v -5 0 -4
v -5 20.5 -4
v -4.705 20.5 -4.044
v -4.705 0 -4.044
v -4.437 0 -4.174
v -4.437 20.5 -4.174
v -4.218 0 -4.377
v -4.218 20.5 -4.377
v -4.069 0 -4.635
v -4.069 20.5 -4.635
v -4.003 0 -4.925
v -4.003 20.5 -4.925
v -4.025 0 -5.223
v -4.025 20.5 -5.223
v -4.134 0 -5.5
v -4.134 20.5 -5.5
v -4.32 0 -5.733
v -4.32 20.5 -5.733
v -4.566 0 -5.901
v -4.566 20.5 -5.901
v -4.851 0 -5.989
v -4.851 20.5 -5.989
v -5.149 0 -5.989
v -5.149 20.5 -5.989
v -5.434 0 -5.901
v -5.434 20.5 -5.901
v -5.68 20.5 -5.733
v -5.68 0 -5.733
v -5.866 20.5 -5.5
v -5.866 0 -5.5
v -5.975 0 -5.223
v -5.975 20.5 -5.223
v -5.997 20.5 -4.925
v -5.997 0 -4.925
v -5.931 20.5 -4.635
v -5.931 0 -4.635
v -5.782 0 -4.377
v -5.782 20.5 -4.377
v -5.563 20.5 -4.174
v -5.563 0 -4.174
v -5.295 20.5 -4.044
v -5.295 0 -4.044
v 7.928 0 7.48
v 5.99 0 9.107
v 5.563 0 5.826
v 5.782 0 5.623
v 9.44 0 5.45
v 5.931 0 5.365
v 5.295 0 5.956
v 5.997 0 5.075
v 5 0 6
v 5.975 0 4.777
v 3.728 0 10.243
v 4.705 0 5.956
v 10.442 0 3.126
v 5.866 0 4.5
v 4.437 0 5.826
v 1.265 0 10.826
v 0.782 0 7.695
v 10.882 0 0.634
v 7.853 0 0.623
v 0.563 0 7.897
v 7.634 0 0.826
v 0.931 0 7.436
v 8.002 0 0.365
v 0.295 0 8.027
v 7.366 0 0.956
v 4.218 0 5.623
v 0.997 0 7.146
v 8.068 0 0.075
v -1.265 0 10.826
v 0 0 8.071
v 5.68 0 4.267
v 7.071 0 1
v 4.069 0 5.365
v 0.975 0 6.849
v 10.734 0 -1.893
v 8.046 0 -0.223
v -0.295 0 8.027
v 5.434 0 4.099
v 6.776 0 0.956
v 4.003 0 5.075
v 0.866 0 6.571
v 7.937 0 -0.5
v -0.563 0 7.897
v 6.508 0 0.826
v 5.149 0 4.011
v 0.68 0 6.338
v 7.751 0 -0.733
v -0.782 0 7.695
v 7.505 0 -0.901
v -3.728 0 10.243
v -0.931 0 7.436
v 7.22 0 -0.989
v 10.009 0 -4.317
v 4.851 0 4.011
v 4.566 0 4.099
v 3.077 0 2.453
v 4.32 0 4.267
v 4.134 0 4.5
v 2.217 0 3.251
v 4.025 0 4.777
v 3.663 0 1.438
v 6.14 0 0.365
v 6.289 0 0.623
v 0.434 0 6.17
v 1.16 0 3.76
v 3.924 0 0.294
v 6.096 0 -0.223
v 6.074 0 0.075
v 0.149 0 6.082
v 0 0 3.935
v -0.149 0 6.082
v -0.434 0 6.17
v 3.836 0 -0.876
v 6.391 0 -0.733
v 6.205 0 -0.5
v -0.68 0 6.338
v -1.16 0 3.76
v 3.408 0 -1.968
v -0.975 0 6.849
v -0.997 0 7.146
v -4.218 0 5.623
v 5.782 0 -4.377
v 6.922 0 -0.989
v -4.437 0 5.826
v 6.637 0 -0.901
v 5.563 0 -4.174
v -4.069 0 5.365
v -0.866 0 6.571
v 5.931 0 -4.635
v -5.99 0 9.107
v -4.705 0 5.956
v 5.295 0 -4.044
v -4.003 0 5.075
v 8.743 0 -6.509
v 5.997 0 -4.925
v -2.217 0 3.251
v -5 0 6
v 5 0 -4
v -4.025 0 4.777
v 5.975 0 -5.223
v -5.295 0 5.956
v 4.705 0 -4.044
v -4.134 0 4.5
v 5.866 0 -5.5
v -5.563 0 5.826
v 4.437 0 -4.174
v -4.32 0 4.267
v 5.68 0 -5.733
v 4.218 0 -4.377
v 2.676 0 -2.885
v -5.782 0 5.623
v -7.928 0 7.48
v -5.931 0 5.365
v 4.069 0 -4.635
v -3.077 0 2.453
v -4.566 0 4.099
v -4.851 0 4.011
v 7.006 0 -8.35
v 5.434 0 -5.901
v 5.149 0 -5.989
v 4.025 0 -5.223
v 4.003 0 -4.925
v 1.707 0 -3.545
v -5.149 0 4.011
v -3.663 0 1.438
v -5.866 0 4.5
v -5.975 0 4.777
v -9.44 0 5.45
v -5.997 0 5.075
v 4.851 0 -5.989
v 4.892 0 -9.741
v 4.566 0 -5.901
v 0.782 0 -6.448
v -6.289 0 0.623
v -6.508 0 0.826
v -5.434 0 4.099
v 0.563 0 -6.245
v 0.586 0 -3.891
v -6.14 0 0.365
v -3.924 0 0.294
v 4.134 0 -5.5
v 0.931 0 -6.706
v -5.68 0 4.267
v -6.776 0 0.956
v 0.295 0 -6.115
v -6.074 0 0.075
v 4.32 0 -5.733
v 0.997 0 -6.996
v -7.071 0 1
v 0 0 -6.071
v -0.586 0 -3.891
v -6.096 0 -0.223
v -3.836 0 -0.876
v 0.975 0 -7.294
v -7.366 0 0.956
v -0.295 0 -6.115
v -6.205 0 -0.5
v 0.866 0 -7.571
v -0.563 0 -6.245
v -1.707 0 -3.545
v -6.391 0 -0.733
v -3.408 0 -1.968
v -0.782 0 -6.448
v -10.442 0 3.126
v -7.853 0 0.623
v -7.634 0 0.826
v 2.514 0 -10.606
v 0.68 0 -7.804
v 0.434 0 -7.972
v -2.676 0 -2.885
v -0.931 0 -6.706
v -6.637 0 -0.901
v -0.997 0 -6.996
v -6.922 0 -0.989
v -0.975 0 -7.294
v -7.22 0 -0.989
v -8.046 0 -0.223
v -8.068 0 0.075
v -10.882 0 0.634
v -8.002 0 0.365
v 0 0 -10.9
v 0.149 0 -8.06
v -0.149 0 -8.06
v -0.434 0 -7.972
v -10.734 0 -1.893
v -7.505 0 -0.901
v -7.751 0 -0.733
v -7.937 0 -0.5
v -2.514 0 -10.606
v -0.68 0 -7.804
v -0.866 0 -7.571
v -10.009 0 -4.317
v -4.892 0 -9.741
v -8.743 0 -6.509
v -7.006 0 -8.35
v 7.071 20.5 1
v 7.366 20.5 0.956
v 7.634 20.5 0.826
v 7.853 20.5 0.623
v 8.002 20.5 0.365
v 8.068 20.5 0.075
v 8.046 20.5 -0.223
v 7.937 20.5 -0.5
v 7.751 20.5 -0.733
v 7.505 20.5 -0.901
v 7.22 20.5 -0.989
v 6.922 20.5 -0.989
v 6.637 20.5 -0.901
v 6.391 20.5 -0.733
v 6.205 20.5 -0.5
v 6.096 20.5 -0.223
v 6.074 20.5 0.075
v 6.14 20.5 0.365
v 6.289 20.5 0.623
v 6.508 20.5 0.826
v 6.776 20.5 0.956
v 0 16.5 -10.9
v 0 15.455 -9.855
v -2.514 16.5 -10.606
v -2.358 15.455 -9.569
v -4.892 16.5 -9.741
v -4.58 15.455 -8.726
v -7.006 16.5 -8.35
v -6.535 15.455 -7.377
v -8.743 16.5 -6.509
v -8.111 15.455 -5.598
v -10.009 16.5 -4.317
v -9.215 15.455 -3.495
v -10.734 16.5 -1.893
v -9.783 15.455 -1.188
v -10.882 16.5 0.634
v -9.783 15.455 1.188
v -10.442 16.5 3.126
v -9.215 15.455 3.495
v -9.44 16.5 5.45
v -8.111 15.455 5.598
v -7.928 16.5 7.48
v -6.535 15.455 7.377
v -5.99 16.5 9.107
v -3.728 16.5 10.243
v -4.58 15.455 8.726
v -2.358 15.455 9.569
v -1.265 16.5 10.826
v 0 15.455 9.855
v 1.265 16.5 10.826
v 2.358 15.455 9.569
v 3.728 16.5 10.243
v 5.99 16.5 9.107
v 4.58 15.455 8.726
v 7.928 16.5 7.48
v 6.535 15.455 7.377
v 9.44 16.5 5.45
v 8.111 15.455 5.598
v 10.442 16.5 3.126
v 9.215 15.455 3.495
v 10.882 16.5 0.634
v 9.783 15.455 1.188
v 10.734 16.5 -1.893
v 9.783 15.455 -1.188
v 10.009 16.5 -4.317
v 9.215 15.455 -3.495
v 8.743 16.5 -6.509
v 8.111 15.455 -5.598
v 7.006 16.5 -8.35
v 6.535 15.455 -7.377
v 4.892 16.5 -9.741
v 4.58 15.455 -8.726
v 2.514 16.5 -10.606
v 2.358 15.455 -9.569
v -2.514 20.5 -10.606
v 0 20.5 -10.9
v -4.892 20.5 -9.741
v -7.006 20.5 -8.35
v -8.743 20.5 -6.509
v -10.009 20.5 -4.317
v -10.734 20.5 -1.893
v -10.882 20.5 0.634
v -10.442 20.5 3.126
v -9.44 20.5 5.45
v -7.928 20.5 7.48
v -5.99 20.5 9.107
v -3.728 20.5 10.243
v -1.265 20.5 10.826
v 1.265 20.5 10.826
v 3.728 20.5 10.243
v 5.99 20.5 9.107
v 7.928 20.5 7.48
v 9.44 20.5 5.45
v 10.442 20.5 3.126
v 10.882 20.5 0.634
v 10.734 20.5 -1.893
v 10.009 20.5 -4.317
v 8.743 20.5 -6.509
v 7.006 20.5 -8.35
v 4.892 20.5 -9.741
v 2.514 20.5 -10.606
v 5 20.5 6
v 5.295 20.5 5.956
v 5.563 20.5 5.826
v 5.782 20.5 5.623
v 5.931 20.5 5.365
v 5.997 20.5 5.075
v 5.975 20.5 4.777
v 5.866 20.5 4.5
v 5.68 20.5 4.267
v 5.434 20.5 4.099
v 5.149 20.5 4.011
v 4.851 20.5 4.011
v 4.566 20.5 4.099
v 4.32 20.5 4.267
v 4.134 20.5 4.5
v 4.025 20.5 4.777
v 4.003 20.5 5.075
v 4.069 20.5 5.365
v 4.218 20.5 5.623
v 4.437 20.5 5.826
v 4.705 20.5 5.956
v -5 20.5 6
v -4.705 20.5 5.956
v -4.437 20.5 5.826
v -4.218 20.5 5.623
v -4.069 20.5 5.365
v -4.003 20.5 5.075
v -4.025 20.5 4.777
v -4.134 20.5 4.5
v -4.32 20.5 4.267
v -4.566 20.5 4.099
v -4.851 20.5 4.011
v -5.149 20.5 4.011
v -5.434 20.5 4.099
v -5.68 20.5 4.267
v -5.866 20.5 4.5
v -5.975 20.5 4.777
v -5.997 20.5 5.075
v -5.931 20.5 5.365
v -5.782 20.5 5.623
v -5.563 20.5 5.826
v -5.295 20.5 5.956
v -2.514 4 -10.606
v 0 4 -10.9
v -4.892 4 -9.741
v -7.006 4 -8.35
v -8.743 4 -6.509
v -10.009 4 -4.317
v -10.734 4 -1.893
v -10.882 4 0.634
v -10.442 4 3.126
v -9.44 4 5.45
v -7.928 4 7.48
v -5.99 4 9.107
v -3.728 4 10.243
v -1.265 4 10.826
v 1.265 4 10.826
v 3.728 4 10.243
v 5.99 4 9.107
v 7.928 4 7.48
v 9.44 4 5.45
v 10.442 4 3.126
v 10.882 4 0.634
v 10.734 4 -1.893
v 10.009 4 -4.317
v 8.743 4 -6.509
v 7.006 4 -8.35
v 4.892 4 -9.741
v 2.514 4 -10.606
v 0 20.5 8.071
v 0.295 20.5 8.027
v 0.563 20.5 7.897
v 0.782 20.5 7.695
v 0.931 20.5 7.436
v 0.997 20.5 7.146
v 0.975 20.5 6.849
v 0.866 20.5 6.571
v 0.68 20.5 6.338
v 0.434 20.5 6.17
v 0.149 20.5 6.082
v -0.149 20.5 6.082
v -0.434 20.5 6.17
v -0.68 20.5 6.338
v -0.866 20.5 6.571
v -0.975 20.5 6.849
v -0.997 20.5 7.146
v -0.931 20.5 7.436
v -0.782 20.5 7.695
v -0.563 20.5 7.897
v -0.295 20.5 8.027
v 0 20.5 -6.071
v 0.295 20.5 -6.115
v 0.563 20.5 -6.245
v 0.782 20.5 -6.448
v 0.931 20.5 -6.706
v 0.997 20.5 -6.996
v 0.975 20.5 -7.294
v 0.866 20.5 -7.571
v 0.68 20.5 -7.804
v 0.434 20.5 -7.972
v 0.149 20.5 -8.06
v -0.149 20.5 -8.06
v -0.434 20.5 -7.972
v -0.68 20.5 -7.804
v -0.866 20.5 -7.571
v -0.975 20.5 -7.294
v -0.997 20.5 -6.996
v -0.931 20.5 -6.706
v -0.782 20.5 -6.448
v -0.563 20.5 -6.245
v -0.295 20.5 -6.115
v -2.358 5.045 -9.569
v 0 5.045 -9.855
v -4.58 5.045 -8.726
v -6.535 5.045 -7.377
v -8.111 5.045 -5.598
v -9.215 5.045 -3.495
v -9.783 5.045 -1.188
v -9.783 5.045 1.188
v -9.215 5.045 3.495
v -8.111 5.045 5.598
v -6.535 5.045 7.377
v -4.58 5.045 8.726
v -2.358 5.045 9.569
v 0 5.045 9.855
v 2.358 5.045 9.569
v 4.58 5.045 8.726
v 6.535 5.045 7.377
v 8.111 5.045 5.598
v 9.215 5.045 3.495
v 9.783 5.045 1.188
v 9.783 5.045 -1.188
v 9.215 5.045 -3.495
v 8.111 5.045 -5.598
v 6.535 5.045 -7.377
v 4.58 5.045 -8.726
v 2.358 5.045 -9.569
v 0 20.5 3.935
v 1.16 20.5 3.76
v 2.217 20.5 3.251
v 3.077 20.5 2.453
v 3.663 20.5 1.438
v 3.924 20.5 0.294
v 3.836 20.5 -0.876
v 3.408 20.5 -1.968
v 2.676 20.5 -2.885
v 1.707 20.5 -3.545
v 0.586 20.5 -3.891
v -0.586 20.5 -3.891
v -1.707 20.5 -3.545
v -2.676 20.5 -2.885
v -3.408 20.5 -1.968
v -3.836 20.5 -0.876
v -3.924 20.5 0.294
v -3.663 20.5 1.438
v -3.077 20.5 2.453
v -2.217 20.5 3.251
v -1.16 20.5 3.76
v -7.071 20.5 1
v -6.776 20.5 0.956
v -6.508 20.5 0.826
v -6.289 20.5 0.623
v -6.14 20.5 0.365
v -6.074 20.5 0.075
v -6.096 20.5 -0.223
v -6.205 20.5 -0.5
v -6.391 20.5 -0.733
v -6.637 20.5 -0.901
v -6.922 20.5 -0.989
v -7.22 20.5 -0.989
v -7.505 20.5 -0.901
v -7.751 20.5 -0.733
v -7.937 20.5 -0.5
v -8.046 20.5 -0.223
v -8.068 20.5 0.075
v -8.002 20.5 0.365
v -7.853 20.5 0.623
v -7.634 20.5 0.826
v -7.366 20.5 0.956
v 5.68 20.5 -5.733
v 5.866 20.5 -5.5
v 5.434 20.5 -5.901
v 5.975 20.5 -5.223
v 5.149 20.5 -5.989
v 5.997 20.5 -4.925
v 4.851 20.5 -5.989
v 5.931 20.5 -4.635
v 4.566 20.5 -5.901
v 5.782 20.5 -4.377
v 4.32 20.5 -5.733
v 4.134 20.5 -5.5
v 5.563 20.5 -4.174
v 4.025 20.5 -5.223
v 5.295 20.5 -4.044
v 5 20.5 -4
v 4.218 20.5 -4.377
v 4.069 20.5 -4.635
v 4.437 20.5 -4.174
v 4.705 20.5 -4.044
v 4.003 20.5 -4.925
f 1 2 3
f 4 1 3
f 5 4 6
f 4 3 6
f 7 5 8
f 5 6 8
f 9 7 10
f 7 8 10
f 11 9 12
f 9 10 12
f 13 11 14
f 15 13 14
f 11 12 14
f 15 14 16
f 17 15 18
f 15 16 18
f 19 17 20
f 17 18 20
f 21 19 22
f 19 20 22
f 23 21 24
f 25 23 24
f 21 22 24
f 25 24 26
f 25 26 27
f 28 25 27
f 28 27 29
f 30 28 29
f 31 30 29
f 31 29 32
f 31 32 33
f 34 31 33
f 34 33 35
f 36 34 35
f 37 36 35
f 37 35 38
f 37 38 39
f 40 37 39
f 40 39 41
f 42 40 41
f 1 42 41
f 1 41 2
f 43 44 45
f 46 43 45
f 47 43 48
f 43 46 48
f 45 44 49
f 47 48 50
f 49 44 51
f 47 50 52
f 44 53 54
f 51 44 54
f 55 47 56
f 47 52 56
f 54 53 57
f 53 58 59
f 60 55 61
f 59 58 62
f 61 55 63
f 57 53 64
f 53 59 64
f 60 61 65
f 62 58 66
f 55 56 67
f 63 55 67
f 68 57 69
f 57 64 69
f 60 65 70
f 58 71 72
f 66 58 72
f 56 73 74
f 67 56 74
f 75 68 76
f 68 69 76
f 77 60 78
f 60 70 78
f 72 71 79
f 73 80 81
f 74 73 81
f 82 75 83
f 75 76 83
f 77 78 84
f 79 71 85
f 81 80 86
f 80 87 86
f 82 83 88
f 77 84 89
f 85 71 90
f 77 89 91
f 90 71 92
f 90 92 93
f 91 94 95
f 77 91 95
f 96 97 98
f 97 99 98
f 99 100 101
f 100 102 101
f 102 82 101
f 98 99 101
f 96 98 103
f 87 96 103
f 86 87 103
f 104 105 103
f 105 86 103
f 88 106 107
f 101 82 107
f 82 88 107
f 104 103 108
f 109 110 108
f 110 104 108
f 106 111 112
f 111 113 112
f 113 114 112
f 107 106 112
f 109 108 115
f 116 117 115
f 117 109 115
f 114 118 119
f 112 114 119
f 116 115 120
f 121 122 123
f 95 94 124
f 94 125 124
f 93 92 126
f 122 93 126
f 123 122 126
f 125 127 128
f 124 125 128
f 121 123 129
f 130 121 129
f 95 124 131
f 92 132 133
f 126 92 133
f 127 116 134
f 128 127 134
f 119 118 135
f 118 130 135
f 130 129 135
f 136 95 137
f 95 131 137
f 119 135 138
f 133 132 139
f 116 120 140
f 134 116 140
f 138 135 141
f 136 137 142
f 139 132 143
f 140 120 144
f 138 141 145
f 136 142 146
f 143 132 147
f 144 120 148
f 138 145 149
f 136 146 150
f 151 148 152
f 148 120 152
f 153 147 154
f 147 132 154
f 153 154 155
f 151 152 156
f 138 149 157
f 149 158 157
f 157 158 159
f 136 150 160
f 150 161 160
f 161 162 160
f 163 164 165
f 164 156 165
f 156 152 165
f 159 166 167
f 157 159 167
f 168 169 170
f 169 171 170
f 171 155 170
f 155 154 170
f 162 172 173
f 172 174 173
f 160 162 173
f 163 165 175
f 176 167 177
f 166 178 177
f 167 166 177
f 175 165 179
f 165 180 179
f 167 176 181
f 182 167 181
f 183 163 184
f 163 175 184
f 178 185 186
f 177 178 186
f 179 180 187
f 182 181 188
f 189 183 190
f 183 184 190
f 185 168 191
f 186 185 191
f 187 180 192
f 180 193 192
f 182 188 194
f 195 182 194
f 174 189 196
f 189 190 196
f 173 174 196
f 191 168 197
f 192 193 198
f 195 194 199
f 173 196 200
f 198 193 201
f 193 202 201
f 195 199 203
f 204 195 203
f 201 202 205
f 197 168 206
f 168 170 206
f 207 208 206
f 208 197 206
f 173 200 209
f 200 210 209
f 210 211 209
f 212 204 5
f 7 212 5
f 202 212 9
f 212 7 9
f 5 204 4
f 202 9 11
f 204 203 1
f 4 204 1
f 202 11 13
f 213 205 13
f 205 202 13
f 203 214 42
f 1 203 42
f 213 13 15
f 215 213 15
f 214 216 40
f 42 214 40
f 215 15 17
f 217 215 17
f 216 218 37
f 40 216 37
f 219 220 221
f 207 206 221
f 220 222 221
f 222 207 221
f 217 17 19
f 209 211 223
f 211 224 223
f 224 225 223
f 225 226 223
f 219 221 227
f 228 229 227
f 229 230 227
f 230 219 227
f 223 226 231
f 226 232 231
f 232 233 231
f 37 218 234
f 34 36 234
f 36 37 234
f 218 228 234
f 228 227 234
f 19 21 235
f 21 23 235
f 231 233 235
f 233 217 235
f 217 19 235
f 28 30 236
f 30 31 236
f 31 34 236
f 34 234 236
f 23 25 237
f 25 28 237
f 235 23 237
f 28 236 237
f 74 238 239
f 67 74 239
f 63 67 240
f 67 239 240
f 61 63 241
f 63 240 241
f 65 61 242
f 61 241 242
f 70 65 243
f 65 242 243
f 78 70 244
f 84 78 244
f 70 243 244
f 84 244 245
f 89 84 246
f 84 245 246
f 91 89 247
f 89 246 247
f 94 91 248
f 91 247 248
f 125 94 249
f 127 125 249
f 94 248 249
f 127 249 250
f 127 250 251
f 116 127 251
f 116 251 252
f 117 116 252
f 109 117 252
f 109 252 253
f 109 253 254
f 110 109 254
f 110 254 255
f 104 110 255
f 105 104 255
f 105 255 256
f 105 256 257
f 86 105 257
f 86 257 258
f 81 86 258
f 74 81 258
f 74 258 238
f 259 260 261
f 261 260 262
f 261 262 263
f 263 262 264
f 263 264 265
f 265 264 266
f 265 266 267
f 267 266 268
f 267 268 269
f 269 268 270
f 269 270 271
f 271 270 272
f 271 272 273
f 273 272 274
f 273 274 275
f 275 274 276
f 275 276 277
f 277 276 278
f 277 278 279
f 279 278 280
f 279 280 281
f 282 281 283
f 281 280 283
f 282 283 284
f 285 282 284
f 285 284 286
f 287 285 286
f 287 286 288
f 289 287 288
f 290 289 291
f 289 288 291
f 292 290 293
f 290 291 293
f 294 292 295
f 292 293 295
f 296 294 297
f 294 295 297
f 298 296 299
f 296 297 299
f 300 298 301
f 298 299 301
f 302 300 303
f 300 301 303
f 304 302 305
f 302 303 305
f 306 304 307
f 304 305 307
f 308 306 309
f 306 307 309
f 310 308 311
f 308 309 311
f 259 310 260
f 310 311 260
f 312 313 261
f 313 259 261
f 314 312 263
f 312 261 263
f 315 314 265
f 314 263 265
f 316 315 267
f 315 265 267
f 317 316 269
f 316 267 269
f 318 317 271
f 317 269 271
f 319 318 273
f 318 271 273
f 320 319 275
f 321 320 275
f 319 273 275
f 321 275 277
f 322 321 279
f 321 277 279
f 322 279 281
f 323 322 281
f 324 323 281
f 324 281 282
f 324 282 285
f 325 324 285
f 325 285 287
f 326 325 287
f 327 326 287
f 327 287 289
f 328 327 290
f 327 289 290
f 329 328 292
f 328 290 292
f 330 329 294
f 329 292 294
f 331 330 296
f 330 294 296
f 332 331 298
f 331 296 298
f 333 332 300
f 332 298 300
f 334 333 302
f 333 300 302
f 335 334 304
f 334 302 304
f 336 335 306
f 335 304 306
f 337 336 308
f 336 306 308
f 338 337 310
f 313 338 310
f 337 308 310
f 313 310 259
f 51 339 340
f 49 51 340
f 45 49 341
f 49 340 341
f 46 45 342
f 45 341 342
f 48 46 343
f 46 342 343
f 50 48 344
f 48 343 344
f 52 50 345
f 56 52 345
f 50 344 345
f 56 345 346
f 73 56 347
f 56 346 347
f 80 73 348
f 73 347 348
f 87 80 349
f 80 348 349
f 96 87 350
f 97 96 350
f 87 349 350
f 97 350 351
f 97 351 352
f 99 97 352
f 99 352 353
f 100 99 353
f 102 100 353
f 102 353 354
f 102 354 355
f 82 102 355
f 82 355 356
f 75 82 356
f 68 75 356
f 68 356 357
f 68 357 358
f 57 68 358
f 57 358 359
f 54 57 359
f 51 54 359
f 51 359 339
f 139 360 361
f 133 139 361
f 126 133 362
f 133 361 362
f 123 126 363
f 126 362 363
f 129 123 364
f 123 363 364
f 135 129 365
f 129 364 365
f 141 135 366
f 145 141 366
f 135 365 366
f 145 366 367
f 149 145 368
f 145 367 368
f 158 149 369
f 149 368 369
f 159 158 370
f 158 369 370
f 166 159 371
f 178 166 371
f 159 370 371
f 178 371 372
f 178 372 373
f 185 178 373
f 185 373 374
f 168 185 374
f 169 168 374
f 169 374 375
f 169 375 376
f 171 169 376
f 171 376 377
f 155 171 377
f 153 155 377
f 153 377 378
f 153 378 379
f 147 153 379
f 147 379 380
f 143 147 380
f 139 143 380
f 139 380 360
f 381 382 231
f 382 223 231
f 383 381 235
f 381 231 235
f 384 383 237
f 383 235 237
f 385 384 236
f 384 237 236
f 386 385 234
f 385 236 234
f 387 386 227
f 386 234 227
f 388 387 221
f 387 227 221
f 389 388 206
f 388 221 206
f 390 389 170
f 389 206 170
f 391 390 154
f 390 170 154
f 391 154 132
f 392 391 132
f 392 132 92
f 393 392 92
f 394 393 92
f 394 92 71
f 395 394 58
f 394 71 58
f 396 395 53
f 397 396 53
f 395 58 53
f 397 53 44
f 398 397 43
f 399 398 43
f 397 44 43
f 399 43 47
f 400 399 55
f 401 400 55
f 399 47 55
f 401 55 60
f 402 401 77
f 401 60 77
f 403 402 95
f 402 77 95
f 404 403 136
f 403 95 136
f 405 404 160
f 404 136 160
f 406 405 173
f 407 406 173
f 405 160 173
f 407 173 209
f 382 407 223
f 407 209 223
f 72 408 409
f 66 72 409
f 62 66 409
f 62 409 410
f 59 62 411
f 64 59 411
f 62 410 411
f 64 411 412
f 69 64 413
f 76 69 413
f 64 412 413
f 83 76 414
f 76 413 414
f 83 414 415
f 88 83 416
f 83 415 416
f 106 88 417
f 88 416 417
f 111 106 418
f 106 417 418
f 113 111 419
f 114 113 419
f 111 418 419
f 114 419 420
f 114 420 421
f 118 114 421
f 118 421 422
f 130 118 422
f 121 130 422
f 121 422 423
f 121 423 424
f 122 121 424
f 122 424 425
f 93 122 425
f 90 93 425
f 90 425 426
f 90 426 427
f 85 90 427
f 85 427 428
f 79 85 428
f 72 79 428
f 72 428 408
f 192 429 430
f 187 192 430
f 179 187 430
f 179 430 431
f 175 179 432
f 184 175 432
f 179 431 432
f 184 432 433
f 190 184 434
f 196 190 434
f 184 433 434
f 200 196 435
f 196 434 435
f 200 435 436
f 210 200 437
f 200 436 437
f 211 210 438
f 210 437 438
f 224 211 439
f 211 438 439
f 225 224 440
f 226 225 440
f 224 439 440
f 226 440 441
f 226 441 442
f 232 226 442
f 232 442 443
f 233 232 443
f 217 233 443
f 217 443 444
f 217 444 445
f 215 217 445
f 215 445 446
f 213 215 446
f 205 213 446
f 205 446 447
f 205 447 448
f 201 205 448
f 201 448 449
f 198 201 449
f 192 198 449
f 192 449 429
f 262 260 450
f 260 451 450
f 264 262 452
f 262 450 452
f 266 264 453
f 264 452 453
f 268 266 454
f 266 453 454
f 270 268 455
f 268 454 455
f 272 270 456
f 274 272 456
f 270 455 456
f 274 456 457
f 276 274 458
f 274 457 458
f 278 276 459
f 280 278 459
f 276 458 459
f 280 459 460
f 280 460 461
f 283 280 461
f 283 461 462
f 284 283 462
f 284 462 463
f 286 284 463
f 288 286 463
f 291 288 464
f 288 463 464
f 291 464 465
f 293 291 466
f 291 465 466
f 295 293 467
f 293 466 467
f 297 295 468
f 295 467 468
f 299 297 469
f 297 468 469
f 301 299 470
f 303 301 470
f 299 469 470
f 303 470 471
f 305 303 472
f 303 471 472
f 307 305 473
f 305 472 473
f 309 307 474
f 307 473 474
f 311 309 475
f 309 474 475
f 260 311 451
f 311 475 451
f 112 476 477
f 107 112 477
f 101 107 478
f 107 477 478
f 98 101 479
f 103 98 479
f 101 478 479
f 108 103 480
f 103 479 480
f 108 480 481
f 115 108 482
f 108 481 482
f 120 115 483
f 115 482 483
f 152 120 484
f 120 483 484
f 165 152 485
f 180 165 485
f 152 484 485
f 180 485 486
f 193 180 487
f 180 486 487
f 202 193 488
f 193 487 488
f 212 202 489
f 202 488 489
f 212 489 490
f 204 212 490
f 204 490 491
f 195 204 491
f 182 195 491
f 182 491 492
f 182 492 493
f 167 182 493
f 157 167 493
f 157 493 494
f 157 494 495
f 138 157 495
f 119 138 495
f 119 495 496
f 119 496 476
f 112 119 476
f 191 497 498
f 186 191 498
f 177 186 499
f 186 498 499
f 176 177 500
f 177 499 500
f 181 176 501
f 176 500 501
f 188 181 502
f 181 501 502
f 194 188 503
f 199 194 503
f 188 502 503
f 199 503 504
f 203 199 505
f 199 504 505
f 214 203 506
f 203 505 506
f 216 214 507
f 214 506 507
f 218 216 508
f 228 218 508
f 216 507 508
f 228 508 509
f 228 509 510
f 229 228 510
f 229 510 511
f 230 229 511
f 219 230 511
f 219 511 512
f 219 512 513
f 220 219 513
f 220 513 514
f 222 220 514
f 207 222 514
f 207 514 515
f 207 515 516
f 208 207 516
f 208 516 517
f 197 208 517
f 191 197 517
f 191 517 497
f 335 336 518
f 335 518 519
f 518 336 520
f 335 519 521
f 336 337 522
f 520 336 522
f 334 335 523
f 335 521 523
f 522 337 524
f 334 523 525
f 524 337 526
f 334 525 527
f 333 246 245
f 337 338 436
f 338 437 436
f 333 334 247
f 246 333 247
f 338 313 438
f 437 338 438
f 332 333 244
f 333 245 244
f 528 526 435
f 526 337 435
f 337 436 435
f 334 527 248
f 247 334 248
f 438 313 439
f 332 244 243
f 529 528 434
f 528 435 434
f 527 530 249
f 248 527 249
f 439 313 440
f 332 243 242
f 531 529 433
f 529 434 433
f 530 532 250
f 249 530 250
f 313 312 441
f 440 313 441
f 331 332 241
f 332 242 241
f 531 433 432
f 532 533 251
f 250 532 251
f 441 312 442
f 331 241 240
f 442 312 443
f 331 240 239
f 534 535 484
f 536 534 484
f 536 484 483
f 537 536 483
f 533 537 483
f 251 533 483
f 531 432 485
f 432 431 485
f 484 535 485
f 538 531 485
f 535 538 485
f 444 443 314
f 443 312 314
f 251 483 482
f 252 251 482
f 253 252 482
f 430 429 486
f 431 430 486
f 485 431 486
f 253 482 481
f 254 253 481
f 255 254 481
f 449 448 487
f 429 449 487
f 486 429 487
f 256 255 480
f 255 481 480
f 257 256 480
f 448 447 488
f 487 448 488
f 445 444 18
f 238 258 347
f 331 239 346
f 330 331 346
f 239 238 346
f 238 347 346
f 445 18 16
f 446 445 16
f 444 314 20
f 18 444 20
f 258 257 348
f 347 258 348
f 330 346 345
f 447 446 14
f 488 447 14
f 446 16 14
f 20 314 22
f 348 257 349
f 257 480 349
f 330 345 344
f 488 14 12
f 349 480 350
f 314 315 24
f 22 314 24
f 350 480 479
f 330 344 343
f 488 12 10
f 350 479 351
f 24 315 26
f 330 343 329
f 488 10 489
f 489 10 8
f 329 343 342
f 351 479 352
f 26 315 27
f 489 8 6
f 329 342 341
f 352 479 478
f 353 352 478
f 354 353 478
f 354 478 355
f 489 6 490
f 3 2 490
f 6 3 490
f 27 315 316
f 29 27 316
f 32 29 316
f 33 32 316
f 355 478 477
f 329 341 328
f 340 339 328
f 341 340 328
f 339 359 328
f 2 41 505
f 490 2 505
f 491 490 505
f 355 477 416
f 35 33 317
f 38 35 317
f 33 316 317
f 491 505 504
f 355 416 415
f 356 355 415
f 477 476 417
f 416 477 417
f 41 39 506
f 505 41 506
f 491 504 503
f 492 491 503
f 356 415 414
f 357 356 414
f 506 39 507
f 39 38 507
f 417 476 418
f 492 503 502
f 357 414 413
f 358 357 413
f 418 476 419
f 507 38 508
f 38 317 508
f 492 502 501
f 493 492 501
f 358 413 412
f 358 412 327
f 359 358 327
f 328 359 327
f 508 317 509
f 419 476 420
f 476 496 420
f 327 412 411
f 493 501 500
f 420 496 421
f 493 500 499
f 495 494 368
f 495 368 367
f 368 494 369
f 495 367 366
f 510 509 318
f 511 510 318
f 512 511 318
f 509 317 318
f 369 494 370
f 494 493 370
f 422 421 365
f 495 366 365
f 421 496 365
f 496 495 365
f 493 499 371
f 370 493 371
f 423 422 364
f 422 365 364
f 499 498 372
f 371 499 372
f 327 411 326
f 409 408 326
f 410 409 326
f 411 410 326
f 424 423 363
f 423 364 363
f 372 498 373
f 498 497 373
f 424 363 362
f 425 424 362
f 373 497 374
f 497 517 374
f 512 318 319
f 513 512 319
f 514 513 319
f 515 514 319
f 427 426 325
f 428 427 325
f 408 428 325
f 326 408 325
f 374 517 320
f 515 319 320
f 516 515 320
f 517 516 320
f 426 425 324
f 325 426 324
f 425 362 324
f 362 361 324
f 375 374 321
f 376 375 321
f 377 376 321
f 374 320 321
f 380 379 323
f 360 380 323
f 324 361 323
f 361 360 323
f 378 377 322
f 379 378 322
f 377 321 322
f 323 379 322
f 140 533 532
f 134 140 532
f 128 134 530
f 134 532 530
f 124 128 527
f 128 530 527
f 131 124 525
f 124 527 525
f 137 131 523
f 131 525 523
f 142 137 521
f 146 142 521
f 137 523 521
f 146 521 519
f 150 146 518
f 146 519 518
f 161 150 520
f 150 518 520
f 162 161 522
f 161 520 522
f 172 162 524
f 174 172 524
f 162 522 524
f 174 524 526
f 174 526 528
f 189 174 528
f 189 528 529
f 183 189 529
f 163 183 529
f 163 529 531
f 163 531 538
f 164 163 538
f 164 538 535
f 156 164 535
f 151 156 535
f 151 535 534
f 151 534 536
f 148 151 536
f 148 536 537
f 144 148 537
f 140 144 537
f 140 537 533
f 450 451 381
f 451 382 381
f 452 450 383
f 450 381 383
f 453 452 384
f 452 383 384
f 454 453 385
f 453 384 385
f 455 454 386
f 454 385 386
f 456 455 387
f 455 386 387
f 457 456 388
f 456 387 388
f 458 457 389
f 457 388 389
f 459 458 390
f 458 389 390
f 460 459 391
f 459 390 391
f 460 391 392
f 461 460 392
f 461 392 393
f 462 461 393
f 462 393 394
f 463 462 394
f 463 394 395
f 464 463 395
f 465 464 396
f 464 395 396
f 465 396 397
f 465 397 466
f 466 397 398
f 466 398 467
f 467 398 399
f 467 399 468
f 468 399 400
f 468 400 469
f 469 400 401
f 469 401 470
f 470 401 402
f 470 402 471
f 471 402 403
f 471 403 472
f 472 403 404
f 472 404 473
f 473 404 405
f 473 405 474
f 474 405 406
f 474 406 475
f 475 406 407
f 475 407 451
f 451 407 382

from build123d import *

# Parameters (mm, degrees)
SKETCH2_R          = 3.935
SKETCH2_R_2        = 1
CUT_EXTRUDE1_DEPTH = 45


with BuildPart() as part:
    # Sketch1 → Revolve1 (revolve)
    with BuildSketch(Plane.XY, mode=Mode.PRIVATE) as revolve1_sk:
        Polygon((-3, 0), (-3, 20.5), (-10.9, 20.5), (-10.9, 16.5), (-9.855, 15.455), (-9.855, 5.045), (-10.9, 4), (-10.9, 0), align=None)
    revolve(revolve1_sk.sketch.rotate(Axis((0, 0, 0), (0, 1, 0)), 270), axis=Axis((0, 0, 0), (0, 1, 0)))

    # Sketch2 → Cut-Extrude1 (cut)
    with BuildSketch(Plane(origin=(0, 20.5, 0), x_dir=(1, 0, 0), z_dir=(0, 1, 0))):
        with Locations(Location((0, 0, 0), (0, 0, 270))):
            Circle(SKETCH2_R)
        with Locations(Location((-5, 5, 0), (0, 0, 270))):
            Circle(SKETCH2_R_2)
        with Locations(Location((5, 5, 0), (0, 0, 270))):
            Circle(SKETCH2_R_2)
        with Locations(Location((5, -5, 0), (0, 0, 270))):
            Circle(SKETCH2_R_2)
        with Locations(Location((-5, -5, 0), (0, 0, 270))):
            Circle(SKETCH2_R_2)
        with Locations(Location((-7.071067812, 0, 0), (0, 0, 270))):
            Circle(SKETCH2_R_2)
        with Locations(Location((0, 7.071067812, 0), (0, 0, 270))):
            Circle(SKETCH2_R_2)
        with Locations(Location((7.071067812, 0, 0), (0, 0, 270))):
            Circle(SKETCH2_R_2)
        with Locations(Location((0, -7.071067812, 0), (0, 0, 270))):
            Circle(SKETCH2_R_2)
    extrude(amount=-CUT_EXTRUDE1_DEPTH, mode=Mode.SUBTRACT)


solid = part.part
